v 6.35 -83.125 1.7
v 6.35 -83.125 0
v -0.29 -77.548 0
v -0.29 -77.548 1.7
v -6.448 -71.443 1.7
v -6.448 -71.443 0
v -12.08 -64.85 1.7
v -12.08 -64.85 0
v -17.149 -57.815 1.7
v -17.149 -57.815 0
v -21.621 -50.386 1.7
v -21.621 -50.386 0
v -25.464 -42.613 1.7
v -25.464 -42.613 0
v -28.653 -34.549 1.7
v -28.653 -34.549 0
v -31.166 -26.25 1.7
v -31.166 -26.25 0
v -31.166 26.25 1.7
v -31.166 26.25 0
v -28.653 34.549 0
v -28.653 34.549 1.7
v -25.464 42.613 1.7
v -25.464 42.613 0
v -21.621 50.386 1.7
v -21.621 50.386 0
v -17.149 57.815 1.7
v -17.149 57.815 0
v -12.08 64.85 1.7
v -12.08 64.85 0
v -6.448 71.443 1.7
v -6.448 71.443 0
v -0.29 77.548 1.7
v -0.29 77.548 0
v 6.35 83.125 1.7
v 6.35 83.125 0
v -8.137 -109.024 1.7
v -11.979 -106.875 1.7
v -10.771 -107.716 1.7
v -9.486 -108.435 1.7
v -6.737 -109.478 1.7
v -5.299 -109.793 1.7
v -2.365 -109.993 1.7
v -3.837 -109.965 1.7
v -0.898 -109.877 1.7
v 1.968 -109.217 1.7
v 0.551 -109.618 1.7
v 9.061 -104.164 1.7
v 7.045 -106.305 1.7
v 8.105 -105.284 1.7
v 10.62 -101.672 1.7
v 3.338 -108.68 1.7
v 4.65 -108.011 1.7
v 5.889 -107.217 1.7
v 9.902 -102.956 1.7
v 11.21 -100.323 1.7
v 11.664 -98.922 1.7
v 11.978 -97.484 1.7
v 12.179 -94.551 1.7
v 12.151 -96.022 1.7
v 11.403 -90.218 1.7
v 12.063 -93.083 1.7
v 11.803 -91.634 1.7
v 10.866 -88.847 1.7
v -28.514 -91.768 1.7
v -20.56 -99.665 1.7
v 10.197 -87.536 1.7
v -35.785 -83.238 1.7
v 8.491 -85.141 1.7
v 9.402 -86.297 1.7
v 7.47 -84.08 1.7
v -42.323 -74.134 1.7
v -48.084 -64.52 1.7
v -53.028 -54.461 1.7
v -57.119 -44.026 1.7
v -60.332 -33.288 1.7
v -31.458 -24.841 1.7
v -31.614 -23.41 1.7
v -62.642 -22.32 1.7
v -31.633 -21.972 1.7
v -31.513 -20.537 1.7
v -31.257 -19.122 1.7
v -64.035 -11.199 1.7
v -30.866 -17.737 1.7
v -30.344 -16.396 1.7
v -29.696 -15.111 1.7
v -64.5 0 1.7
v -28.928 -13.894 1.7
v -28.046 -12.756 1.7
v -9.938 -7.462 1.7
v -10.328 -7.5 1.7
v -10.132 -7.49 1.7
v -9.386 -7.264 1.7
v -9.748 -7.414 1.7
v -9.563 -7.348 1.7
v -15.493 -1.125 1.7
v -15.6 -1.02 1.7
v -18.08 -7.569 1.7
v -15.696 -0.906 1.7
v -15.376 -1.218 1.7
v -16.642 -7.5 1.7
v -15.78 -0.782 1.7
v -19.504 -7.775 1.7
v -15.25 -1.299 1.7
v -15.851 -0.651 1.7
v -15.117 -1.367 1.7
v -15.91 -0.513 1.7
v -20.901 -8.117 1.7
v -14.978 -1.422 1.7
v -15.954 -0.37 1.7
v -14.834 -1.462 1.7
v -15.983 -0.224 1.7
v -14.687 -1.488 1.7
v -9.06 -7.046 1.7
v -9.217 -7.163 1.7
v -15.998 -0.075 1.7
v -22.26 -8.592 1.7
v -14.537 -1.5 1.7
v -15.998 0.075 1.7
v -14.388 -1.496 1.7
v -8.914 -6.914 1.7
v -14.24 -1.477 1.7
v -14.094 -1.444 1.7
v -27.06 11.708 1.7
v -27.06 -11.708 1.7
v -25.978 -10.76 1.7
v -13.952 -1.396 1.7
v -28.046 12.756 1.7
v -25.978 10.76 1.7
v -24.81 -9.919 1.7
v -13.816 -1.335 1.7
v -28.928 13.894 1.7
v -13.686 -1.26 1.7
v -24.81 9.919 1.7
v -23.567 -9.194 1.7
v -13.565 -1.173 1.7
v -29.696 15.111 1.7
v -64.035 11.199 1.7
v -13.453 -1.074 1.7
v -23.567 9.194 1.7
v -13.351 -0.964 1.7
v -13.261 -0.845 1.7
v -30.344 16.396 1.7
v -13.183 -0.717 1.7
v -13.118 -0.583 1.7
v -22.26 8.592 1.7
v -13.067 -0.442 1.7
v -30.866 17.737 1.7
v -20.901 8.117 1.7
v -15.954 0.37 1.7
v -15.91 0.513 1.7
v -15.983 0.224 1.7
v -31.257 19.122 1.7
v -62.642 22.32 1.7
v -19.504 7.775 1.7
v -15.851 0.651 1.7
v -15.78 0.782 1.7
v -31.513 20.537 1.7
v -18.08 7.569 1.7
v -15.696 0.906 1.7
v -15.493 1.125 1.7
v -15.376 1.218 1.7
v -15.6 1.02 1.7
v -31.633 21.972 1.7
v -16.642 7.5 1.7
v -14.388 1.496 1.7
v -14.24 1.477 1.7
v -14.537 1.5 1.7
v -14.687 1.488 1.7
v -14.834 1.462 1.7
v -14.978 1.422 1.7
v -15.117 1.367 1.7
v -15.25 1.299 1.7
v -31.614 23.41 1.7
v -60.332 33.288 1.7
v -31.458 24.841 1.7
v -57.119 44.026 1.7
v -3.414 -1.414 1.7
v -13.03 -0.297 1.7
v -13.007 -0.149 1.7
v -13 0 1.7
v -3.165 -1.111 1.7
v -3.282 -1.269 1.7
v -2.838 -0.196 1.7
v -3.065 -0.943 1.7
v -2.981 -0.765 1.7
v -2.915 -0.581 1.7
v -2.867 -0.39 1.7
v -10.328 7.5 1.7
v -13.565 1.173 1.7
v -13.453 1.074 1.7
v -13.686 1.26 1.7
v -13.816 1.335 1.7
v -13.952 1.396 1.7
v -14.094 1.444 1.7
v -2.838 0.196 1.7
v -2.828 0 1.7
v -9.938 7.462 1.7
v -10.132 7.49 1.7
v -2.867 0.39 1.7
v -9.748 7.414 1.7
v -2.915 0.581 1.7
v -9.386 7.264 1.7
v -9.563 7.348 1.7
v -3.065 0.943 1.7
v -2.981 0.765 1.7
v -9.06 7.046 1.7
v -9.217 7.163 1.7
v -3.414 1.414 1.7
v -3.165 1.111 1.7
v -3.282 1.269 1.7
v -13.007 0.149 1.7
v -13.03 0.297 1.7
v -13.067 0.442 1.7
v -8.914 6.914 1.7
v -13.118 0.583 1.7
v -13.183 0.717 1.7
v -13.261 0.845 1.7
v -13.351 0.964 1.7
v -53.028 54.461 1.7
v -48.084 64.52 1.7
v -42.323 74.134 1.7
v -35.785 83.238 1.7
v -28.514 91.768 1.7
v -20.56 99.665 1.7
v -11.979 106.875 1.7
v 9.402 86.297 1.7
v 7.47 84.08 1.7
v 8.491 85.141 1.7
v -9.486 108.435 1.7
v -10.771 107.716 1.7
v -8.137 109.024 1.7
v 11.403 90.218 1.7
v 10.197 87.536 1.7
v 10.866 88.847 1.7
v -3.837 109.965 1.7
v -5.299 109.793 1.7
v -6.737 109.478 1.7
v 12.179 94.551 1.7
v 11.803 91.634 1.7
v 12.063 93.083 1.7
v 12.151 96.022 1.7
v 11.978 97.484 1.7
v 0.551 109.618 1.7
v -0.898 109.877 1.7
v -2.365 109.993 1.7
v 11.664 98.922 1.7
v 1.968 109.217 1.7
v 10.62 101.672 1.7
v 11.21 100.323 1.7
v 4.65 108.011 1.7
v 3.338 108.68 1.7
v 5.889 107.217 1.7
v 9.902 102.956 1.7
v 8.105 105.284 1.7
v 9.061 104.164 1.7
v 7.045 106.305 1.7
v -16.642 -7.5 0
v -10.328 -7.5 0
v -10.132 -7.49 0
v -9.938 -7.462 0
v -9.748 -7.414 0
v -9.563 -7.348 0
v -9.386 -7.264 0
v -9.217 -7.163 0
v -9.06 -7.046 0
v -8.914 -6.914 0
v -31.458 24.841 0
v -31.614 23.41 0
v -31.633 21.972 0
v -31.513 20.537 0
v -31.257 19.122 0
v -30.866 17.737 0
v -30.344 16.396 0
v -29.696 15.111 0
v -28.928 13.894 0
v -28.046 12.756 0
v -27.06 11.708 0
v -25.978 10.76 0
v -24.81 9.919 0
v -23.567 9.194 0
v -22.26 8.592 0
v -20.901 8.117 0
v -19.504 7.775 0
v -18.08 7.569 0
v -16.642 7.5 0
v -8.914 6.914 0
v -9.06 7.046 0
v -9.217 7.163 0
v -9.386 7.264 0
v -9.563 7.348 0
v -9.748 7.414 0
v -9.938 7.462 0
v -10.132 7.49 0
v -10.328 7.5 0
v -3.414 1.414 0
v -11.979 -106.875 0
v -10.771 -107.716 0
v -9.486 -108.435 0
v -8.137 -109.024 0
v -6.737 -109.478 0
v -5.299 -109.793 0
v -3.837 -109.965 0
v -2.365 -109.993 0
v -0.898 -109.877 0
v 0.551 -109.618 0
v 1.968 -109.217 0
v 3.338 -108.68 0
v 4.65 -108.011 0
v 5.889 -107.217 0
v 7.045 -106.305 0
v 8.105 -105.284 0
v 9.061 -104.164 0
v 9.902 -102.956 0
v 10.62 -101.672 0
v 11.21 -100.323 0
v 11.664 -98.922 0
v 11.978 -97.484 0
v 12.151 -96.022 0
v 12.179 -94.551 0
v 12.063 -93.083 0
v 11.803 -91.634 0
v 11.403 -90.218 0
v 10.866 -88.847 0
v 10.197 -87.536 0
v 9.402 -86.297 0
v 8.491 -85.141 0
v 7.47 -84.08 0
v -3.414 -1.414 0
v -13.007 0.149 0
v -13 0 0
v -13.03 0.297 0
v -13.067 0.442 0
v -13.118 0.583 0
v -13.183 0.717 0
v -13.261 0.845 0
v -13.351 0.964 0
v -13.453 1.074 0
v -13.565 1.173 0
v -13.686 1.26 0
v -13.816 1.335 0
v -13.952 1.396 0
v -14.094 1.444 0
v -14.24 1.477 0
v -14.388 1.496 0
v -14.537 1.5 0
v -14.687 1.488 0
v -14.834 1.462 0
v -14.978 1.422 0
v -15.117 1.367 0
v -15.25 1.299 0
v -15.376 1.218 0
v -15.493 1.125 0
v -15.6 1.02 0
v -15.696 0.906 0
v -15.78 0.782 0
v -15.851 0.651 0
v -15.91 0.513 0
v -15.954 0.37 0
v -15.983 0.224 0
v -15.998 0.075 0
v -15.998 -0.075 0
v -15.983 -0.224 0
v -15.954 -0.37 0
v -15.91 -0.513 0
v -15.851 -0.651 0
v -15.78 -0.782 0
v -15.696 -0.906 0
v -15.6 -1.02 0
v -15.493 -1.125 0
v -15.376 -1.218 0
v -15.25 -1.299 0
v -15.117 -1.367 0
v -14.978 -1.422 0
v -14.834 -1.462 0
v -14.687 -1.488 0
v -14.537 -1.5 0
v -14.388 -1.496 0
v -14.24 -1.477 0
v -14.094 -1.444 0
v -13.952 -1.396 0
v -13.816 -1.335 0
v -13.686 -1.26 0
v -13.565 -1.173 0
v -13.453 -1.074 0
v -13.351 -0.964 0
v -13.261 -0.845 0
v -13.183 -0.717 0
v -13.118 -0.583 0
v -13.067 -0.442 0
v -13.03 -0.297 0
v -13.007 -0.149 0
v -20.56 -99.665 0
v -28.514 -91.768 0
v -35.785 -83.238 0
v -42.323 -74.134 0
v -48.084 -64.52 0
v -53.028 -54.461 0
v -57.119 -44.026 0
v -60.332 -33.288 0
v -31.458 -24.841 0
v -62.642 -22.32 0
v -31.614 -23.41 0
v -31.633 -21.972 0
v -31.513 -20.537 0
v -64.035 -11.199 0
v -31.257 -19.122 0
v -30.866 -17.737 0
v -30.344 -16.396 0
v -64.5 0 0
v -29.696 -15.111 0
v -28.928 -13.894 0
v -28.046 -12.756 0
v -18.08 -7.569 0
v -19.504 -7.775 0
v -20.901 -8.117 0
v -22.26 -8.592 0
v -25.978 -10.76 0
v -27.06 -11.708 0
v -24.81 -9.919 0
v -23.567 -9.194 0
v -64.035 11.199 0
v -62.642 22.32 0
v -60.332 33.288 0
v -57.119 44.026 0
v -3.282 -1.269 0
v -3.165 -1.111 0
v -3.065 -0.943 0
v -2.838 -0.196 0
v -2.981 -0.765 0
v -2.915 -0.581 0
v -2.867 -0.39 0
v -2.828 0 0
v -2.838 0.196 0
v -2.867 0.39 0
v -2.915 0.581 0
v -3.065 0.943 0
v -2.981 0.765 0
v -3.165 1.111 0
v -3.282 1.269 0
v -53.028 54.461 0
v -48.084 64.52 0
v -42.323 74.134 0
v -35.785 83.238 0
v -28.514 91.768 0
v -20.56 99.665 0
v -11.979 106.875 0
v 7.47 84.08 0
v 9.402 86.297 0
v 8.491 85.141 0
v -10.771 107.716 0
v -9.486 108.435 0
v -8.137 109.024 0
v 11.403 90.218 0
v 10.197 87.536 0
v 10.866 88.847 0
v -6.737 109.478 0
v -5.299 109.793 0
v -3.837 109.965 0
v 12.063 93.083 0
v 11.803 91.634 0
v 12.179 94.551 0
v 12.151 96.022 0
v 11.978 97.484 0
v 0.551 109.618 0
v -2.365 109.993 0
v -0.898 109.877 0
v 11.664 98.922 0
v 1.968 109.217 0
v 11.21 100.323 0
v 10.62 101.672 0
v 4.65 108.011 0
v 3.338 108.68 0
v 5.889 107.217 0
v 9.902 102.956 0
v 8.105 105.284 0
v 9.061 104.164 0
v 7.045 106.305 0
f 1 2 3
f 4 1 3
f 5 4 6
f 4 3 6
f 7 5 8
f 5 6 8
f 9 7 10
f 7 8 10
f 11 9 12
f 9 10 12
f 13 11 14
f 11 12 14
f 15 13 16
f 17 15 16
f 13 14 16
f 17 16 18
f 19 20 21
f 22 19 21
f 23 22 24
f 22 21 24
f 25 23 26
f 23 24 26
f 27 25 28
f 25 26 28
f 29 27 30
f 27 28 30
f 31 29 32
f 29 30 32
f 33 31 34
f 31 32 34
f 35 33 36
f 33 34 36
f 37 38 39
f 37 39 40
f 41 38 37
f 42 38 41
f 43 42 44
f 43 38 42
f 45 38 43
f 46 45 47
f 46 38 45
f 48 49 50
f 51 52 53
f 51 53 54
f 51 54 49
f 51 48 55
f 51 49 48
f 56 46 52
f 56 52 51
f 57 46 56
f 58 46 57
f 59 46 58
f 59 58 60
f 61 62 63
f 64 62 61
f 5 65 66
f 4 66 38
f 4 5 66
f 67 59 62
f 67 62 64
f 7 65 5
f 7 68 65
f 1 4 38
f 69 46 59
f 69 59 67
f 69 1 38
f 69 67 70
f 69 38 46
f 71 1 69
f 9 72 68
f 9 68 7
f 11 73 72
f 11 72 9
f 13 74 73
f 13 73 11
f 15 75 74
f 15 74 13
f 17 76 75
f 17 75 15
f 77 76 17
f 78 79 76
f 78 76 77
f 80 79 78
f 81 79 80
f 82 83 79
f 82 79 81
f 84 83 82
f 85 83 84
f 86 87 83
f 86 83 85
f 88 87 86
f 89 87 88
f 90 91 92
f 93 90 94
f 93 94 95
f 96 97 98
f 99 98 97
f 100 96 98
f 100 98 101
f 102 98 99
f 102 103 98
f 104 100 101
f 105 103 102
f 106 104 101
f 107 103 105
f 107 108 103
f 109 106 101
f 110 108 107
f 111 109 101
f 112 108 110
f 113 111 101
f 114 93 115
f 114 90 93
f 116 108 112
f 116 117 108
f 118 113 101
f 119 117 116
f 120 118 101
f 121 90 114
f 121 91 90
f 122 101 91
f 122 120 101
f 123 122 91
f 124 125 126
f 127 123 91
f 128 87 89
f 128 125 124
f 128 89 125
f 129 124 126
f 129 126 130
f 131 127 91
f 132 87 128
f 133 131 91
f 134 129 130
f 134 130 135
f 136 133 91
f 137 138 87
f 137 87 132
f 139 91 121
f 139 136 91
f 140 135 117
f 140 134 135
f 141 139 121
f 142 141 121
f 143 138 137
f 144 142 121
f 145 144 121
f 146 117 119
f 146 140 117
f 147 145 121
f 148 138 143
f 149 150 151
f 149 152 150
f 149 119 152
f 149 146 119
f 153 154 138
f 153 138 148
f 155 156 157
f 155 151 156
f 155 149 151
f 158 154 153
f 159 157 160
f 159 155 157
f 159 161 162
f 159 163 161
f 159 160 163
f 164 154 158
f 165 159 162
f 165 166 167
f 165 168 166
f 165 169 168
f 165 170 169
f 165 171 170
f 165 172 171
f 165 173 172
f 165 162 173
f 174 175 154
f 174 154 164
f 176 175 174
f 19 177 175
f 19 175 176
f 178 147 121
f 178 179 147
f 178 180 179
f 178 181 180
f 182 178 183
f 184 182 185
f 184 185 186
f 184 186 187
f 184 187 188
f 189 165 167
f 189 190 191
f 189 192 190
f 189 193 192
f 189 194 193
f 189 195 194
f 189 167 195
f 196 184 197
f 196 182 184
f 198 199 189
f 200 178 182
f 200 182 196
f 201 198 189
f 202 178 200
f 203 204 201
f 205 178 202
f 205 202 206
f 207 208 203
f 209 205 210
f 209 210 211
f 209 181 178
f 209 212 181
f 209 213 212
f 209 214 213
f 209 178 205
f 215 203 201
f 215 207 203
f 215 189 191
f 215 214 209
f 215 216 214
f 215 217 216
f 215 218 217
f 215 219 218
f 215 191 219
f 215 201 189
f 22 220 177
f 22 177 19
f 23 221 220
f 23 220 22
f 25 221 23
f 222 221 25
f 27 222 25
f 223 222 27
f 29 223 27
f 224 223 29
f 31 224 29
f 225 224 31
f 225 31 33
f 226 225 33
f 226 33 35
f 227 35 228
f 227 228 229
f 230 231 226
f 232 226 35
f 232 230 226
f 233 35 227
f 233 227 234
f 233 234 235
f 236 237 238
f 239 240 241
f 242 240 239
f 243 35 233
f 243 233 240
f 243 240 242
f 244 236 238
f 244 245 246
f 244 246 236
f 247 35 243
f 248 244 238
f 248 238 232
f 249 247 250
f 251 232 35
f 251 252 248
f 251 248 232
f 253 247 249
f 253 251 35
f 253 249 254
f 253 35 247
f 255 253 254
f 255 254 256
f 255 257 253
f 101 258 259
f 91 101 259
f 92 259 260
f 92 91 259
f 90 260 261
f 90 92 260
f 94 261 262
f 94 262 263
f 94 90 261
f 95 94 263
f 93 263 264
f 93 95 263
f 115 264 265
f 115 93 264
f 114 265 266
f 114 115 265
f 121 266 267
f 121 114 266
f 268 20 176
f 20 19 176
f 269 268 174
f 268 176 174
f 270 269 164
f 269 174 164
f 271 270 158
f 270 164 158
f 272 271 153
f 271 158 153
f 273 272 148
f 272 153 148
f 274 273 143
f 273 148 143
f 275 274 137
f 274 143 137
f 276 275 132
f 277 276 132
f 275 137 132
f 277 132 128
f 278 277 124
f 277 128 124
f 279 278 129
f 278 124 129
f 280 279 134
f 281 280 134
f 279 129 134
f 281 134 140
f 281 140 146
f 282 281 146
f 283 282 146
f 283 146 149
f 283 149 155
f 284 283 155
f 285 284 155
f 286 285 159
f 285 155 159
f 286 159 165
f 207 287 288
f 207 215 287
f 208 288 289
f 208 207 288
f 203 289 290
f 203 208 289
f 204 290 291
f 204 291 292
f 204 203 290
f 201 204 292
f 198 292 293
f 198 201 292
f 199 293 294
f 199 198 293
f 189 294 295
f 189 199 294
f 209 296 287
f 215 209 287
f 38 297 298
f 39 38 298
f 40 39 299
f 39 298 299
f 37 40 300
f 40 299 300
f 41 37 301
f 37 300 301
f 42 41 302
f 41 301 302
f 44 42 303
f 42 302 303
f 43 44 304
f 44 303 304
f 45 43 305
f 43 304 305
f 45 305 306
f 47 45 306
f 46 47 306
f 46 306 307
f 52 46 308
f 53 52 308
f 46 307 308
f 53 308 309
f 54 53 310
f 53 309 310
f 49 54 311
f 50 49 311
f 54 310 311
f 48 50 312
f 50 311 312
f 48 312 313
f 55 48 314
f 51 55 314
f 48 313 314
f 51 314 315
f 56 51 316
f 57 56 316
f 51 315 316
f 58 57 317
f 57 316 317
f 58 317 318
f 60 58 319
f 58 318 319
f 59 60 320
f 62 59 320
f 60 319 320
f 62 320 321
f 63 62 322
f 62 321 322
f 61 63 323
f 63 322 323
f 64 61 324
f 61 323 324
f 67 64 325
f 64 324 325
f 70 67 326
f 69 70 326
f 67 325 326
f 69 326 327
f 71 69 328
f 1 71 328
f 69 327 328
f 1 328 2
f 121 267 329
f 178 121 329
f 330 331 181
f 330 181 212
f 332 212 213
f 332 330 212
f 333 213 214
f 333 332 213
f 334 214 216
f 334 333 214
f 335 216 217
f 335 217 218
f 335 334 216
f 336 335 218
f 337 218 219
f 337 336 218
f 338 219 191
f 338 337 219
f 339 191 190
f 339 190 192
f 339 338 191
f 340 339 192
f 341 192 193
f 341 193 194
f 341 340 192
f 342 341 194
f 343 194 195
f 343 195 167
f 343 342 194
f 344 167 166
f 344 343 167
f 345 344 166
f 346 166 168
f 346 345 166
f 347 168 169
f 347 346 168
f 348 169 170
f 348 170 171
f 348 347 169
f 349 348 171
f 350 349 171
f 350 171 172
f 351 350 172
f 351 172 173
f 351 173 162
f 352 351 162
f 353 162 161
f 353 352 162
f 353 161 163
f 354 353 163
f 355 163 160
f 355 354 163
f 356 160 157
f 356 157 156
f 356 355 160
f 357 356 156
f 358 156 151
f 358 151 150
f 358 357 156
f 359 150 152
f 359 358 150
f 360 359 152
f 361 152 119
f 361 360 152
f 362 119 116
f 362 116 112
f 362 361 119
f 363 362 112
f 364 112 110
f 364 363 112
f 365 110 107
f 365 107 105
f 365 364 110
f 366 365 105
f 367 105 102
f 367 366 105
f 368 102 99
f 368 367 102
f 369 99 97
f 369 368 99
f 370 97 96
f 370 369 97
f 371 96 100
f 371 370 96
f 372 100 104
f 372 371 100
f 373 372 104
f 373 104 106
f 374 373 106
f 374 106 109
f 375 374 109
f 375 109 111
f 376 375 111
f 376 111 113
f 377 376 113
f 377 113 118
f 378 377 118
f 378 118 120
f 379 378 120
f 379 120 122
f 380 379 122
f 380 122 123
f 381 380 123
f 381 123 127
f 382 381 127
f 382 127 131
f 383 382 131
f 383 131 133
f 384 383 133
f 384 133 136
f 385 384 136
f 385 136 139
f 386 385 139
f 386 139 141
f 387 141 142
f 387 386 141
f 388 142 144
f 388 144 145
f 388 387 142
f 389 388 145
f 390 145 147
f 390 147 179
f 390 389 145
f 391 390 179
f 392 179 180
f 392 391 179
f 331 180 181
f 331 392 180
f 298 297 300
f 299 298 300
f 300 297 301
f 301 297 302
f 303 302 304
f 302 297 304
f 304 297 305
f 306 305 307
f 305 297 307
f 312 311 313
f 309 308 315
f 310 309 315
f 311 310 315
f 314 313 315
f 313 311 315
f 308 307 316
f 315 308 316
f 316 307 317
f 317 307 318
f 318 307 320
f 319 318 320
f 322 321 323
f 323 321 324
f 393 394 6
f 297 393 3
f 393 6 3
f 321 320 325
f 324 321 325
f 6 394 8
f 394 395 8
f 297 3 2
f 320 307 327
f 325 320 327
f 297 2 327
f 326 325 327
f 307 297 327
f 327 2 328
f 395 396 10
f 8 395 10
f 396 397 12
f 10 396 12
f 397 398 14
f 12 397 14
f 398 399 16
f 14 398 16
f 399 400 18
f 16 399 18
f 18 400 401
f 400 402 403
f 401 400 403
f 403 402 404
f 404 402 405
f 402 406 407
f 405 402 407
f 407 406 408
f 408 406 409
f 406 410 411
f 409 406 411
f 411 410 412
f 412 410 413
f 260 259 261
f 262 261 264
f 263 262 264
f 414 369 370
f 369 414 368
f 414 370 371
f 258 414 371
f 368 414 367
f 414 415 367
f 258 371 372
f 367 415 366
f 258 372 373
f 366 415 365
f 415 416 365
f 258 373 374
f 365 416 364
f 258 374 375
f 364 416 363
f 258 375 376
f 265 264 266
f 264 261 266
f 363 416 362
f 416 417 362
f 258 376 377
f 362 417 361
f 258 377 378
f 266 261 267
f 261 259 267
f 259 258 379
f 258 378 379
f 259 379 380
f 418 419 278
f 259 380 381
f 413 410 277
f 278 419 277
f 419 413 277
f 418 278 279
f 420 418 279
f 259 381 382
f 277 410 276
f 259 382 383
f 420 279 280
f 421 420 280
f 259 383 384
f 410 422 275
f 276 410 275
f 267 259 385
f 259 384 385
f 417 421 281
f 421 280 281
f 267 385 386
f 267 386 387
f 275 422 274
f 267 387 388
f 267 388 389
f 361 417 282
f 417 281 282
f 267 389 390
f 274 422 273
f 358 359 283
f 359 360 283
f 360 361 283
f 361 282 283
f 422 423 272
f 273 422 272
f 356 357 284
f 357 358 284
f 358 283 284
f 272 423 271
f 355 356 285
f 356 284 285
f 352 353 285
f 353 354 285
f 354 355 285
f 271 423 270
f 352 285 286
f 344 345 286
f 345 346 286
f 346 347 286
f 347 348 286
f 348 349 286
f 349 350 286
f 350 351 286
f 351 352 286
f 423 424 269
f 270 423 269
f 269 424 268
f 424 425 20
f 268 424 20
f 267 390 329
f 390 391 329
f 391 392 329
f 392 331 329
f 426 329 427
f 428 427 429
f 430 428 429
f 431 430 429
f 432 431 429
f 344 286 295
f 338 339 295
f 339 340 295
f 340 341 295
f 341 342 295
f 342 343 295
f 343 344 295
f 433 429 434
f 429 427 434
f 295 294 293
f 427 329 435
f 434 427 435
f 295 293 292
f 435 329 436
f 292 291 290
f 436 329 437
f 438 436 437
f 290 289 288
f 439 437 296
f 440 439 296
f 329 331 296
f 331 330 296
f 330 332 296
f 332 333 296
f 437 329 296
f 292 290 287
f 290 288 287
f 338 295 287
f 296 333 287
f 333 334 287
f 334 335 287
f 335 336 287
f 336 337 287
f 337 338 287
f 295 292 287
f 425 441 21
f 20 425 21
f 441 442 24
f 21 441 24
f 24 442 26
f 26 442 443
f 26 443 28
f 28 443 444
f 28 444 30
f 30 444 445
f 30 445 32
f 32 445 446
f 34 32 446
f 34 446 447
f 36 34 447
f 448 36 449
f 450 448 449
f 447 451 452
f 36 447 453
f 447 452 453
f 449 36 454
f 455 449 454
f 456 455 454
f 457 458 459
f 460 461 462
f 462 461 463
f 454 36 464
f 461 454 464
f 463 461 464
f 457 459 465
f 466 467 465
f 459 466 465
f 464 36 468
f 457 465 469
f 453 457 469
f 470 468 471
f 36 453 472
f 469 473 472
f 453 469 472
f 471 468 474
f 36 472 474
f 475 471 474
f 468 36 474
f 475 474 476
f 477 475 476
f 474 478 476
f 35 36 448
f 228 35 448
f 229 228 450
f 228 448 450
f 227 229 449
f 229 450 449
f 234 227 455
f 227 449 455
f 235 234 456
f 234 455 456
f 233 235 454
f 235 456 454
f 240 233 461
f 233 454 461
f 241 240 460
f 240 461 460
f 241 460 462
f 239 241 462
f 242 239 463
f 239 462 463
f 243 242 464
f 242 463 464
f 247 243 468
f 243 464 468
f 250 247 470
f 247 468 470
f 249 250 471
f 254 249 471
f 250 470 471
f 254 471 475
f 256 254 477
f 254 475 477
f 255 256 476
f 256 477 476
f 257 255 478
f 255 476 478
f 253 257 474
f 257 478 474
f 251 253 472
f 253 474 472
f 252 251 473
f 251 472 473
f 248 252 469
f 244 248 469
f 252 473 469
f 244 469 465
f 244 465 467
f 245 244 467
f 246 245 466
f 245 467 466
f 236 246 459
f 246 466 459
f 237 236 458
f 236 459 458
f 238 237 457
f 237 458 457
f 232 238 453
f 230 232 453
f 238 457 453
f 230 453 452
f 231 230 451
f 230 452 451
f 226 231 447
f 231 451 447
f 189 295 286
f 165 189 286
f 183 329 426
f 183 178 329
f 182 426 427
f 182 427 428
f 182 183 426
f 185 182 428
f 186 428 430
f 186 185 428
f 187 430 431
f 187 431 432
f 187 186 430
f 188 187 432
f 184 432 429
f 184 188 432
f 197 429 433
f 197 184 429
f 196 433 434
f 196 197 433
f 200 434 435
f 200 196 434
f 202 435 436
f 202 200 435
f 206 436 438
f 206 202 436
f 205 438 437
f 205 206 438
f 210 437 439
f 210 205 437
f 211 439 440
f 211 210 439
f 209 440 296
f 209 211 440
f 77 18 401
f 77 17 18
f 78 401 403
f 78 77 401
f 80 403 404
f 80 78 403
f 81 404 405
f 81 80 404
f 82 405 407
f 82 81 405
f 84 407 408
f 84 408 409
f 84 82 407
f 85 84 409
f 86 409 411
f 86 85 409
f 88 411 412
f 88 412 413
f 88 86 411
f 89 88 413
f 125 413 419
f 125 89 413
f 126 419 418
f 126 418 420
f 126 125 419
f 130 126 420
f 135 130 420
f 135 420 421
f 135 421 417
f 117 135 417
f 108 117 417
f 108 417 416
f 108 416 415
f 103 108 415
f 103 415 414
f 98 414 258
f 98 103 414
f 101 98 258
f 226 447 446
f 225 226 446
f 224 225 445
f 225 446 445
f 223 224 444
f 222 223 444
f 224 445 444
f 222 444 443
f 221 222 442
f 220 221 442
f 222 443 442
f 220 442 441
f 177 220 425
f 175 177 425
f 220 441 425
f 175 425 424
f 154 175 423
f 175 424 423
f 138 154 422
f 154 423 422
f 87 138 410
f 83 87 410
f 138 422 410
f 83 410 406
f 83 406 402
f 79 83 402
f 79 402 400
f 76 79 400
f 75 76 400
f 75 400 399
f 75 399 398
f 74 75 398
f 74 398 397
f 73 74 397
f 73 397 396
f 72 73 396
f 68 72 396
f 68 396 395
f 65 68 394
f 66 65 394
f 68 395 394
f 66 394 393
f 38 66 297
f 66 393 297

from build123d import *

# Parameters (mm, degrees)
SKETCH1_R           = 1.5
BOSS_EXTRUDE1_DEPTH = 1.7
FILLET1_R           = 15
FILLET2_R           = 2


with BuildPart() as part:
    # Sketch1 → Boss-Extrude1 (new body)
    with BuildSketch(Plane.XY):
        with BuildLine():
            ThreePointArc((-11.978690547, -106.87499991), (9.060608653, -104.164298748), (6.349906949, -83.124999619))
            ThreePointArc((6.349906949, -83.124999619), (-22.020584843, -49.648176002), (-34.231800328, -7.5))
            Line((-34.231800328, -7.5), (-9.5, -7.5))
            Line((-9.5, -7.5), (-2, 0))
            Line((-2, 0), (-9.5, 7.5))
            Line((-9.5, 7.5), (-34.231800328, 7.5))
            ThreePointArc((-34.231800328, 7.5), (-22.020584884, 49.648175925), (6.349906811, 83.124999512))
            ThreePointArc((6.349906811, 83.124999512), (9.060608694, 104.164298694), (-11.978690577, 106.874999887))
            ThreePointArc((-11.978690577, 106.874999887), (-64.5, -1.9e-08), (-11.978690547, -106.87499991))
        make_face()
        with Locations((-14.5, 0)):
            Circle(SKETCH1_R, mode=Mode.SUBTRACT)
    extrude(amount=BOSS_EXTRUDE1_DEPTH)

    # Fillet1
    fillet1_edges = [part.edges().sort_by_distance(p)[0] for p in [
        (-34.231800328, -7.5, 0.85),
        (-34.231800328, 7.5, 0.85),
    ]]
    fillet(fillet1_edges, radius=FILLET1_R)

    # Fillet2
    fillet2_edges = [part.edges().sort_by_distance(p)[0] for p in [
        (-9.5, 7.5, 0.85),
        (-2, 0, 0.85),
        (-9.5, -7.5, 0.85),
    ]]
    fillet(fillet2_edges, radius=FILLET2_R)


solid = part.part
